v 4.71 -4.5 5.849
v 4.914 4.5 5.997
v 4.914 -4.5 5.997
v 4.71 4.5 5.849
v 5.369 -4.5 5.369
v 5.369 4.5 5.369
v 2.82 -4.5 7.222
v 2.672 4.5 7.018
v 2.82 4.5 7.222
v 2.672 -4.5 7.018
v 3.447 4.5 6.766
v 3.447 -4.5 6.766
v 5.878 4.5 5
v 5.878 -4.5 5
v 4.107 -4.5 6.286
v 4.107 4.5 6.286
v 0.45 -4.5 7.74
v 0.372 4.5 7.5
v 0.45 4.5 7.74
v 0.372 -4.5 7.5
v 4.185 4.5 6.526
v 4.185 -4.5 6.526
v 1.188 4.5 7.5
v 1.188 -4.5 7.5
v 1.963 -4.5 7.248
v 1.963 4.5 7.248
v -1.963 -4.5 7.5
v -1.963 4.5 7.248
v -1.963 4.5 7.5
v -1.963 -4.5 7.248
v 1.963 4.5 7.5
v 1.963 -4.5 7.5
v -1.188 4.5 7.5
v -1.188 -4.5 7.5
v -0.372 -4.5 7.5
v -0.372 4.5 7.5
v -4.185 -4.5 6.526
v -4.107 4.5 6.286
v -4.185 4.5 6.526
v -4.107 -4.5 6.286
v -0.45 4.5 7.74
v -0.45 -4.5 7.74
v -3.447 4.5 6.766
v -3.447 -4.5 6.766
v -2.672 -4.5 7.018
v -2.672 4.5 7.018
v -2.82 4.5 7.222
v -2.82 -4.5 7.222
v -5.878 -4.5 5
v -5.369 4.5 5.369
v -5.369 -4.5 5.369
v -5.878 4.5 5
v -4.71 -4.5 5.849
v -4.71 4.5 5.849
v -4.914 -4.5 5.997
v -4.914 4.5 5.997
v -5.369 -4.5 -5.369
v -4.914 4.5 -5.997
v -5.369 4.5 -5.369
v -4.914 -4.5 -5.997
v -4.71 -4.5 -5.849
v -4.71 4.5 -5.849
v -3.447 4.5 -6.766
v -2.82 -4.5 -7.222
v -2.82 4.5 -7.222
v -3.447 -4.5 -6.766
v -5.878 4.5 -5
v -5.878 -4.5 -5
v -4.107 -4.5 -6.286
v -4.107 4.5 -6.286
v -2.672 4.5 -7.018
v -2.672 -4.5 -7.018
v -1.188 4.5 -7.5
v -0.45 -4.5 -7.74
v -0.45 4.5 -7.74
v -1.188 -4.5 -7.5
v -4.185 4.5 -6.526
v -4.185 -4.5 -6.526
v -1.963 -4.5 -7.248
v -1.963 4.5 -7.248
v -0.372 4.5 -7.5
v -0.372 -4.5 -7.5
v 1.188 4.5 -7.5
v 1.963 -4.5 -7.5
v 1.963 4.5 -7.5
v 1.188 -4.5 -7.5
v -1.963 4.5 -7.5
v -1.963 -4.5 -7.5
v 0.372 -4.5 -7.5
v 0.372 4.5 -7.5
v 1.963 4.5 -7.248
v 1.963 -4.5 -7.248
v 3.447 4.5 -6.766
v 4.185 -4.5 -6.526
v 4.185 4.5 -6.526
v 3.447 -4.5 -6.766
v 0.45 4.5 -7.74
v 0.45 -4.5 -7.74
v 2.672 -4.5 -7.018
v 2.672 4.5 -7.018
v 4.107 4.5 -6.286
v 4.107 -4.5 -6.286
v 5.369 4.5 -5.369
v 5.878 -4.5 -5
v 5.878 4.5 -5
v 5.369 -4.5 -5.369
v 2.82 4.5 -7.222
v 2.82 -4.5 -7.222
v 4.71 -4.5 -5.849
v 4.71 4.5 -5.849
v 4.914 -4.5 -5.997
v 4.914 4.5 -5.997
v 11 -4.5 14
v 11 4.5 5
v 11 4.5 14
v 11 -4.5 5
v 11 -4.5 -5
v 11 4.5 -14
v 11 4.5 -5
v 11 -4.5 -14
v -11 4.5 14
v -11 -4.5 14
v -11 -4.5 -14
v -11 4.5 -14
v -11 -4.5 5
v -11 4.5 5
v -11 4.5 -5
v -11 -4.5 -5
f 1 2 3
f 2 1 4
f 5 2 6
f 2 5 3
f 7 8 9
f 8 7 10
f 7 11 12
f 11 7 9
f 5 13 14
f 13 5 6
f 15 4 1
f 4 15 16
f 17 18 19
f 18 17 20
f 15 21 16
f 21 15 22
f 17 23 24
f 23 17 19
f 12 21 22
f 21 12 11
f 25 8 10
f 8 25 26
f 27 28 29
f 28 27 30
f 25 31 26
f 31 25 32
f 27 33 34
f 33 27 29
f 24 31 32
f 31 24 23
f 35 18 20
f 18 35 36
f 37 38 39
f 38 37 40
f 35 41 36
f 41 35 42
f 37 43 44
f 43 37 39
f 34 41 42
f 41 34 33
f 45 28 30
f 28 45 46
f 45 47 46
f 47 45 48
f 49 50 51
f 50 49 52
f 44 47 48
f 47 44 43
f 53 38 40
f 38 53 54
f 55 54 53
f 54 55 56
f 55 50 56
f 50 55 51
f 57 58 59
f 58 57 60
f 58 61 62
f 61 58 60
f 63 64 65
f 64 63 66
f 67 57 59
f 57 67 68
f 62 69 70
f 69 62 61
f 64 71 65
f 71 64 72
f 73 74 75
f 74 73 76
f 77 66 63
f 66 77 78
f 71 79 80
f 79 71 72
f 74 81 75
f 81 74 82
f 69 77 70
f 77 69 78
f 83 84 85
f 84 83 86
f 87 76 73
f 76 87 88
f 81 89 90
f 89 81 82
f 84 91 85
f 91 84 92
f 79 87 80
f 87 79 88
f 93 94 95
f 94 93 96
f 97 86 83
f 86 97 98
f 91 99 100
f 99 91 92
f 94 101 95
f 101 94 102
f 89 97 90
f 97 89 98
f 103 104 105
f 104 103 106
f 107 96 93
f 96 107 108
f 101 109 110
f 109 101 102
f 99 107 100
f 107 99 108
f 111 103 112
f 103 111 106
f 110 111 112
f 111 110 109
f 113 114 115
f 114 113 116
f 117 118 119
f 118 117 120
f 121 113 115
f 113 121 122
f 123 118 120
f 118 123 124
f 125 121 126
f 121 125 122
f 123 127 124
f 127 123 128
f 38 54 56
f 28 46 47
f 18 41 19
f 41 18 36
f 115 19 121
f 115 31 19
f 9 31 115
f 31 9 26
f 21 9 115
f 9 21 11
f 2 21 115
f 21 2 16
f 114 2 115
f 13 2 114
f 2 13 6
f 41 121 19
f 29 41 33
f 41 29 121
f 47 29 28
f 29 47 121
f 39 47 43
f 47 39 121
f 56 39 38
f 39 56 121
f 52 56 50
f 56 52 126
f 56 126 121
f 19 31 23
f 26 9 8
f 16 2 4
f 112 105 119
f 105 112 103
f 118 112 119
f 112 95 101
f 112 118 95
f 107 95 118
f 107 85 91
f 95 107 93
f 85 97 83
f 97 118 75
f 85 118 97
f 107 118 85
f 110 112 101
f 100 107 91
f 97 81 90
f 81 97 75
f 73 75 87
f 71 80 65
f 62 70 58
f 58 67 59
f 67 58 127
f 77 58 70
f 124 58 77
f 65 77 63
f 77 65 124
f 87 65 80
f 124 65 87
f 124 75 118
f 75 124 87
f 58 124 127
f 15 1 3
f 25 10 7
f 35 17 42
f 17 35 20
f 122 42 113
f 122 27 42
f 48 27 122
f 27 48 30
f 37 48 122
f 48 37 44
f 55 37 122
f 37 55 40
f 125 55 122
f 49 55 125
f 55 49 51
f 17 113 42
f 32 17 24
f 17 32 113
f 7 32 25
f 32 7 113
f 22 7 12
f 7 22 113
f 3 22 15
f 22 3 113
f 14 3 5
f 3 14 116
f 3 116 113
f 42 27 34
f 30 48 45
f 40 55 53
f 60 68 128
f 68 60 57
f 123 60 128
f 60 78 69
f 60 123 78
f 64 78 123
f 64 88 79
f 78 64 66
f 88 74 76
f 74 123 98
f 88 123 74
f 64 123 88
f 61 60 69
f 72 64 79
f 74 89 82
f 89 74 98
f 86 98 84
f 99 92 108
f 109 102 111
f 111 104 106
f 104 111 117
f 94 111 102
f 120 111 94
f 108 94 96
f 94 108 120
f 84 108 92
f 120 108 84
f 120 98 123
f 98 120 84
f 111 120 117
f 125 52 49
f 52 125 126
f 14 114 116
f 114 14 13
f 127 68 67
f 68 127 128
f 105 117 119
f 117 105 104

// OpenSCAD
num_teeth = 20;
tooth_depth = 1;  // How deep the teeth cut into the circle
tooth_width_angle = 30; // Angular width of each tooth in degrees

// Main dimensions
width = 22;    // X dimension
depth = 9;   // Y dimension  
height = 28;   // Z dimension
hole_diameter = 15;


difference() {
    // Main cube
    cube([width, depth, height], center=true);
    
    // Cylinder hole with gear teeth
    rotate([90, 0, 0]) {
        // Main cylinder hole
        cylinder(h=depth + 1, d=hole_diameter, center=true, $fn=50);
        
        // Add teeth cutting into the cylinder
        for(i = [0:num_teeth-1]) {
            rotate([0, 0, i * 360/num_teeth])
                translate([hole_diameter/2 - tooth_depth/2, 0, 0])
                    cube([tooth_depth, tooth_width_angle * hole_diameter * 3.14159 / 360, depth + 1], center=true);
        }
    }
    
    // Horizontal slot - 2mm tall cube through the center
    // This creates a slot through the entire width and depth
    cube([width + 1, depth + 1, 10], center=true);
}
